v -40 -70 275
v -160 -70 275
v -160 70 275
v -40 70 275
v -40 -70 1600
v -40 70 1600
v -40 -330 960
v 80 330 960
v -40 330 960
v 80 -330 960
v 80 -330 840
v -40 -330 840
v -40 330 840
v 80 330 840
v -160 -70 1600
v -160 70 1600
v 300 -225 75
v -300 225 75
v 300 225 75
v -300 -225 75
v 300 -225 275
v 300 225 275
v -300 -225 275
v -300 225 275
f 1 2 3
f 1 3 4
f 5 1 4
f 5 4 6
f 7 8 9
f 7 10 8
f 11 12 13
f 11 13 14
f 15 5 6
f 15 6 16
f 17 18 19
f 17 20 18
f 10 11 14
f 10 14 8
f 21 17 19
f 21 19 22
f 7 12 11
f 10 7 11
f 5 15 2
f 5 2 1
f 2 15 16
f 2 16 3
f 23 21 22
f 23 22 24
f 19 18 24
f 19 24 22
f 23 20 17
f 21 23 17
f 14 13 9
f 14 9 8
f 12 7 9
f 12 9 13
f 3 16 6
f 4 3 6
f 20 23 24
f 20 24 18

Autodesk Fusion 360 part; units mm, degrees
sketch "Layout_Side" plane through (0, 0, 0) normal (0, 1, 0) x (1, 0, 0) in component "00_Layout"
  line L0 (0, 0) -> (0, -1676.4) construction
  line L1 (300, -275) -> (-300, -275) construction
  line L2 (-300, -275) -> (-300, -75) construction
  line L3 (-300, -75) -> (300, -75) construction
  line L4 (300, -75) -> (300, -275) construction
  line L5 (300, -275) -> (-300, -75) construction
  line L6 (-300, -275) -> (300, -75) construction
  line L7 (0, -1676.4) -> (600, -1676.4) construction
  line L8 (0, -175) -> (0, -75) construction
  dimension "d1" = 200
  dimension "d2" = 600
  dimension "d4" = 600
  dimension "d5" = 75
  dimension "d6" = 1676.4
sketch "Base_Profile" plane through (0, 0, 0) normal (0, 1, 0) x (1, 0, 0) in component "01_Base_Envelope"
  line L0 (300, -275) -> (-300, -275)
  line L1 (-300, -275) -> (-300, -75)
  line L2 (-300, -75) -> (300, -75)
  line L3 (300, -75) -> (300, -275)
extrude "Chassis_Width_450mm" add sketch "Base_Profile" along normal mid plane 450 makes body 1 in component "01_Base_Envelope"
sketch "Mast_Envelope_Side_Profile" plane through (0, 0, 0) normal (0, 1, 0) x (1, 0, 0) in component "02_Mast_Envelope"
  line L0 (-160, -275) -> (-40, -275)
  line L1 (-40, -275) -> (-40, -1600)
  line L2 (-40, -1600) -> (-160, -1600)
  line L3 (-160, -1600) -> (-160, -275)
  line L4 (300, -275) -> (-300, -275) construction
  dimension "d9" = 120
  dimension "d10" = 1325
  dimension "d11" = 160
extrude "Mast_Envelope_Width_140mm" add sketch "Mast_Envelope_Side_Profile" along normal mid plane 140 separate body makes body 2 in component "02_Mast_Envelope"
sketch "Shared_Carriage_Side_Profile" plane through (0, 0, 0) normal (0, 1, 0) x (1, 0, 0) in component "03_Shared_Carriage"
  line L0 (-40, -840) -> (80, -840)
  line L1 (80, -840) -> (80, -960)
  line L2 (80, -960) -> (-40, -960)
  line L3 (-40, -960) -> (-40, -840)
  dimension "d14" = 120
  dimension "d15" = 120
  dimension "d16" = 40
  dimension "d17" = 840
extrude "Shared_Carriage_Width_660mm" add sketch "Shared_Carriage_Side_Profile" along normal mid plane 660 separate body makes body 3 in component "03_Shared_Carriage"
ref_plane "WorkPlane1" through (0, 300, 0) normal (0, 1, 0) x (0, 0, 1) in component "00_Layout"
sketch "Reach_Left_Floor_2x304p8mm" plane through (0, 300, 0) normal (0, 1, 0) x (1, 0, 0) in component "00_Layout"
  circle A0 centre (80, -400) radius 609.6 construction
  line L0 (80, -400) -> (380.0994, -346.6765) construction
  line L1 (380.0994, -346.6765) -> (450, -50) construction
  dimension "d25" = 80
  dimension "d26" = 400
  dimension "d27" = 450
  dimension "d28" = 50
  dimension "d29" = 609.6
  dimension "d30" = 304.8
  dimension "d31" = 304.8
sketch "Reach_Left_Shelf_2x304p8mm" plane through (0, 300, 0) normal (0, 1, 0) x (1, 0, 0) in component "00_Layout"
  circle A0 centre (80, -1400) radius 609.6 construction
  line L0 (80, -1400) -> (198.6357, -1680.7643) construction
  line L1 (198.6357, -1680.7643) -> (500, -1726.4) construction
  dimension "d32" = 80
  dimension "d33" = 1400
  dimension "d34" = 500
  dimension "d35" = 1726.4
  dimension "d36" = 609.6
  dimension "d37" = 304.8
  dimension "d38" = 304.8
ref_plane "WorkPlane2" through (0, -300, 0) normal (0, 1, 0) x (0, 0, 1) in component "00_Layout"
sketch "Reach_Right_Floor_2x304p8mm" plane through (0, -300, 0) normal (0, 1, 0) x (1, 0, 0) in component "00_Layout"
  circle A0 centre (80, -400) radius 609.6 construction
  line L0 (80, -400) -> (380.0994, -346.6765) construction
  line L1 (380.0994, -346.6765) -> (450, -50) construction
  dimension "d41" = 80
  dimension "d42" = 400
  dimension "d43" = 450
  dimension "d44" = 50
  dimension "d45" = 609.6
  dimension "d46" = 304.8
  dimension "d47" = 304.8
sketch "Reach_Right_Shelf_2x304p8mm" plane through (0, -300, 0) normal (0, 1, 0) x (1, 0, 0) in component "00_Layout"
  circle A0 centre (80, -1400) radius 609.6 construction
  line L0 (80, -1400) -> (198.6357, -1680.7643) construction
  line L1 (198.6357, -1680.7643) -> (500, -1726.4) construction
  dimension "d48" = 80
  dimension "d49" = 1400
  dimension "d50" = 500
  dimension "d51" = 1726.4
  dimension "d52" = 609.6
  dimension "d53" = 304.8
  dimension "d54" = 304.8
component "00_Layout" placed x (1, 0, 0) y (0, 1, 0) z (0, 0, 1) at (0, 0, 0)
component "01_Base_Envelope" placed x (1, 0, 0) y (0, 1, 0) z (0, 0, 1) at (0, 0, 0)
component "02_Mast_Envelope" placed x (1, 0, 0) y (0, 1, 0) z (0, 0, 1) at (0, 0, 0)
component "03_Shared_Carriage" placed x (1, 0, 0) y (0, 1, 0) z (0, 0, 1) at (0, 0, 0)
